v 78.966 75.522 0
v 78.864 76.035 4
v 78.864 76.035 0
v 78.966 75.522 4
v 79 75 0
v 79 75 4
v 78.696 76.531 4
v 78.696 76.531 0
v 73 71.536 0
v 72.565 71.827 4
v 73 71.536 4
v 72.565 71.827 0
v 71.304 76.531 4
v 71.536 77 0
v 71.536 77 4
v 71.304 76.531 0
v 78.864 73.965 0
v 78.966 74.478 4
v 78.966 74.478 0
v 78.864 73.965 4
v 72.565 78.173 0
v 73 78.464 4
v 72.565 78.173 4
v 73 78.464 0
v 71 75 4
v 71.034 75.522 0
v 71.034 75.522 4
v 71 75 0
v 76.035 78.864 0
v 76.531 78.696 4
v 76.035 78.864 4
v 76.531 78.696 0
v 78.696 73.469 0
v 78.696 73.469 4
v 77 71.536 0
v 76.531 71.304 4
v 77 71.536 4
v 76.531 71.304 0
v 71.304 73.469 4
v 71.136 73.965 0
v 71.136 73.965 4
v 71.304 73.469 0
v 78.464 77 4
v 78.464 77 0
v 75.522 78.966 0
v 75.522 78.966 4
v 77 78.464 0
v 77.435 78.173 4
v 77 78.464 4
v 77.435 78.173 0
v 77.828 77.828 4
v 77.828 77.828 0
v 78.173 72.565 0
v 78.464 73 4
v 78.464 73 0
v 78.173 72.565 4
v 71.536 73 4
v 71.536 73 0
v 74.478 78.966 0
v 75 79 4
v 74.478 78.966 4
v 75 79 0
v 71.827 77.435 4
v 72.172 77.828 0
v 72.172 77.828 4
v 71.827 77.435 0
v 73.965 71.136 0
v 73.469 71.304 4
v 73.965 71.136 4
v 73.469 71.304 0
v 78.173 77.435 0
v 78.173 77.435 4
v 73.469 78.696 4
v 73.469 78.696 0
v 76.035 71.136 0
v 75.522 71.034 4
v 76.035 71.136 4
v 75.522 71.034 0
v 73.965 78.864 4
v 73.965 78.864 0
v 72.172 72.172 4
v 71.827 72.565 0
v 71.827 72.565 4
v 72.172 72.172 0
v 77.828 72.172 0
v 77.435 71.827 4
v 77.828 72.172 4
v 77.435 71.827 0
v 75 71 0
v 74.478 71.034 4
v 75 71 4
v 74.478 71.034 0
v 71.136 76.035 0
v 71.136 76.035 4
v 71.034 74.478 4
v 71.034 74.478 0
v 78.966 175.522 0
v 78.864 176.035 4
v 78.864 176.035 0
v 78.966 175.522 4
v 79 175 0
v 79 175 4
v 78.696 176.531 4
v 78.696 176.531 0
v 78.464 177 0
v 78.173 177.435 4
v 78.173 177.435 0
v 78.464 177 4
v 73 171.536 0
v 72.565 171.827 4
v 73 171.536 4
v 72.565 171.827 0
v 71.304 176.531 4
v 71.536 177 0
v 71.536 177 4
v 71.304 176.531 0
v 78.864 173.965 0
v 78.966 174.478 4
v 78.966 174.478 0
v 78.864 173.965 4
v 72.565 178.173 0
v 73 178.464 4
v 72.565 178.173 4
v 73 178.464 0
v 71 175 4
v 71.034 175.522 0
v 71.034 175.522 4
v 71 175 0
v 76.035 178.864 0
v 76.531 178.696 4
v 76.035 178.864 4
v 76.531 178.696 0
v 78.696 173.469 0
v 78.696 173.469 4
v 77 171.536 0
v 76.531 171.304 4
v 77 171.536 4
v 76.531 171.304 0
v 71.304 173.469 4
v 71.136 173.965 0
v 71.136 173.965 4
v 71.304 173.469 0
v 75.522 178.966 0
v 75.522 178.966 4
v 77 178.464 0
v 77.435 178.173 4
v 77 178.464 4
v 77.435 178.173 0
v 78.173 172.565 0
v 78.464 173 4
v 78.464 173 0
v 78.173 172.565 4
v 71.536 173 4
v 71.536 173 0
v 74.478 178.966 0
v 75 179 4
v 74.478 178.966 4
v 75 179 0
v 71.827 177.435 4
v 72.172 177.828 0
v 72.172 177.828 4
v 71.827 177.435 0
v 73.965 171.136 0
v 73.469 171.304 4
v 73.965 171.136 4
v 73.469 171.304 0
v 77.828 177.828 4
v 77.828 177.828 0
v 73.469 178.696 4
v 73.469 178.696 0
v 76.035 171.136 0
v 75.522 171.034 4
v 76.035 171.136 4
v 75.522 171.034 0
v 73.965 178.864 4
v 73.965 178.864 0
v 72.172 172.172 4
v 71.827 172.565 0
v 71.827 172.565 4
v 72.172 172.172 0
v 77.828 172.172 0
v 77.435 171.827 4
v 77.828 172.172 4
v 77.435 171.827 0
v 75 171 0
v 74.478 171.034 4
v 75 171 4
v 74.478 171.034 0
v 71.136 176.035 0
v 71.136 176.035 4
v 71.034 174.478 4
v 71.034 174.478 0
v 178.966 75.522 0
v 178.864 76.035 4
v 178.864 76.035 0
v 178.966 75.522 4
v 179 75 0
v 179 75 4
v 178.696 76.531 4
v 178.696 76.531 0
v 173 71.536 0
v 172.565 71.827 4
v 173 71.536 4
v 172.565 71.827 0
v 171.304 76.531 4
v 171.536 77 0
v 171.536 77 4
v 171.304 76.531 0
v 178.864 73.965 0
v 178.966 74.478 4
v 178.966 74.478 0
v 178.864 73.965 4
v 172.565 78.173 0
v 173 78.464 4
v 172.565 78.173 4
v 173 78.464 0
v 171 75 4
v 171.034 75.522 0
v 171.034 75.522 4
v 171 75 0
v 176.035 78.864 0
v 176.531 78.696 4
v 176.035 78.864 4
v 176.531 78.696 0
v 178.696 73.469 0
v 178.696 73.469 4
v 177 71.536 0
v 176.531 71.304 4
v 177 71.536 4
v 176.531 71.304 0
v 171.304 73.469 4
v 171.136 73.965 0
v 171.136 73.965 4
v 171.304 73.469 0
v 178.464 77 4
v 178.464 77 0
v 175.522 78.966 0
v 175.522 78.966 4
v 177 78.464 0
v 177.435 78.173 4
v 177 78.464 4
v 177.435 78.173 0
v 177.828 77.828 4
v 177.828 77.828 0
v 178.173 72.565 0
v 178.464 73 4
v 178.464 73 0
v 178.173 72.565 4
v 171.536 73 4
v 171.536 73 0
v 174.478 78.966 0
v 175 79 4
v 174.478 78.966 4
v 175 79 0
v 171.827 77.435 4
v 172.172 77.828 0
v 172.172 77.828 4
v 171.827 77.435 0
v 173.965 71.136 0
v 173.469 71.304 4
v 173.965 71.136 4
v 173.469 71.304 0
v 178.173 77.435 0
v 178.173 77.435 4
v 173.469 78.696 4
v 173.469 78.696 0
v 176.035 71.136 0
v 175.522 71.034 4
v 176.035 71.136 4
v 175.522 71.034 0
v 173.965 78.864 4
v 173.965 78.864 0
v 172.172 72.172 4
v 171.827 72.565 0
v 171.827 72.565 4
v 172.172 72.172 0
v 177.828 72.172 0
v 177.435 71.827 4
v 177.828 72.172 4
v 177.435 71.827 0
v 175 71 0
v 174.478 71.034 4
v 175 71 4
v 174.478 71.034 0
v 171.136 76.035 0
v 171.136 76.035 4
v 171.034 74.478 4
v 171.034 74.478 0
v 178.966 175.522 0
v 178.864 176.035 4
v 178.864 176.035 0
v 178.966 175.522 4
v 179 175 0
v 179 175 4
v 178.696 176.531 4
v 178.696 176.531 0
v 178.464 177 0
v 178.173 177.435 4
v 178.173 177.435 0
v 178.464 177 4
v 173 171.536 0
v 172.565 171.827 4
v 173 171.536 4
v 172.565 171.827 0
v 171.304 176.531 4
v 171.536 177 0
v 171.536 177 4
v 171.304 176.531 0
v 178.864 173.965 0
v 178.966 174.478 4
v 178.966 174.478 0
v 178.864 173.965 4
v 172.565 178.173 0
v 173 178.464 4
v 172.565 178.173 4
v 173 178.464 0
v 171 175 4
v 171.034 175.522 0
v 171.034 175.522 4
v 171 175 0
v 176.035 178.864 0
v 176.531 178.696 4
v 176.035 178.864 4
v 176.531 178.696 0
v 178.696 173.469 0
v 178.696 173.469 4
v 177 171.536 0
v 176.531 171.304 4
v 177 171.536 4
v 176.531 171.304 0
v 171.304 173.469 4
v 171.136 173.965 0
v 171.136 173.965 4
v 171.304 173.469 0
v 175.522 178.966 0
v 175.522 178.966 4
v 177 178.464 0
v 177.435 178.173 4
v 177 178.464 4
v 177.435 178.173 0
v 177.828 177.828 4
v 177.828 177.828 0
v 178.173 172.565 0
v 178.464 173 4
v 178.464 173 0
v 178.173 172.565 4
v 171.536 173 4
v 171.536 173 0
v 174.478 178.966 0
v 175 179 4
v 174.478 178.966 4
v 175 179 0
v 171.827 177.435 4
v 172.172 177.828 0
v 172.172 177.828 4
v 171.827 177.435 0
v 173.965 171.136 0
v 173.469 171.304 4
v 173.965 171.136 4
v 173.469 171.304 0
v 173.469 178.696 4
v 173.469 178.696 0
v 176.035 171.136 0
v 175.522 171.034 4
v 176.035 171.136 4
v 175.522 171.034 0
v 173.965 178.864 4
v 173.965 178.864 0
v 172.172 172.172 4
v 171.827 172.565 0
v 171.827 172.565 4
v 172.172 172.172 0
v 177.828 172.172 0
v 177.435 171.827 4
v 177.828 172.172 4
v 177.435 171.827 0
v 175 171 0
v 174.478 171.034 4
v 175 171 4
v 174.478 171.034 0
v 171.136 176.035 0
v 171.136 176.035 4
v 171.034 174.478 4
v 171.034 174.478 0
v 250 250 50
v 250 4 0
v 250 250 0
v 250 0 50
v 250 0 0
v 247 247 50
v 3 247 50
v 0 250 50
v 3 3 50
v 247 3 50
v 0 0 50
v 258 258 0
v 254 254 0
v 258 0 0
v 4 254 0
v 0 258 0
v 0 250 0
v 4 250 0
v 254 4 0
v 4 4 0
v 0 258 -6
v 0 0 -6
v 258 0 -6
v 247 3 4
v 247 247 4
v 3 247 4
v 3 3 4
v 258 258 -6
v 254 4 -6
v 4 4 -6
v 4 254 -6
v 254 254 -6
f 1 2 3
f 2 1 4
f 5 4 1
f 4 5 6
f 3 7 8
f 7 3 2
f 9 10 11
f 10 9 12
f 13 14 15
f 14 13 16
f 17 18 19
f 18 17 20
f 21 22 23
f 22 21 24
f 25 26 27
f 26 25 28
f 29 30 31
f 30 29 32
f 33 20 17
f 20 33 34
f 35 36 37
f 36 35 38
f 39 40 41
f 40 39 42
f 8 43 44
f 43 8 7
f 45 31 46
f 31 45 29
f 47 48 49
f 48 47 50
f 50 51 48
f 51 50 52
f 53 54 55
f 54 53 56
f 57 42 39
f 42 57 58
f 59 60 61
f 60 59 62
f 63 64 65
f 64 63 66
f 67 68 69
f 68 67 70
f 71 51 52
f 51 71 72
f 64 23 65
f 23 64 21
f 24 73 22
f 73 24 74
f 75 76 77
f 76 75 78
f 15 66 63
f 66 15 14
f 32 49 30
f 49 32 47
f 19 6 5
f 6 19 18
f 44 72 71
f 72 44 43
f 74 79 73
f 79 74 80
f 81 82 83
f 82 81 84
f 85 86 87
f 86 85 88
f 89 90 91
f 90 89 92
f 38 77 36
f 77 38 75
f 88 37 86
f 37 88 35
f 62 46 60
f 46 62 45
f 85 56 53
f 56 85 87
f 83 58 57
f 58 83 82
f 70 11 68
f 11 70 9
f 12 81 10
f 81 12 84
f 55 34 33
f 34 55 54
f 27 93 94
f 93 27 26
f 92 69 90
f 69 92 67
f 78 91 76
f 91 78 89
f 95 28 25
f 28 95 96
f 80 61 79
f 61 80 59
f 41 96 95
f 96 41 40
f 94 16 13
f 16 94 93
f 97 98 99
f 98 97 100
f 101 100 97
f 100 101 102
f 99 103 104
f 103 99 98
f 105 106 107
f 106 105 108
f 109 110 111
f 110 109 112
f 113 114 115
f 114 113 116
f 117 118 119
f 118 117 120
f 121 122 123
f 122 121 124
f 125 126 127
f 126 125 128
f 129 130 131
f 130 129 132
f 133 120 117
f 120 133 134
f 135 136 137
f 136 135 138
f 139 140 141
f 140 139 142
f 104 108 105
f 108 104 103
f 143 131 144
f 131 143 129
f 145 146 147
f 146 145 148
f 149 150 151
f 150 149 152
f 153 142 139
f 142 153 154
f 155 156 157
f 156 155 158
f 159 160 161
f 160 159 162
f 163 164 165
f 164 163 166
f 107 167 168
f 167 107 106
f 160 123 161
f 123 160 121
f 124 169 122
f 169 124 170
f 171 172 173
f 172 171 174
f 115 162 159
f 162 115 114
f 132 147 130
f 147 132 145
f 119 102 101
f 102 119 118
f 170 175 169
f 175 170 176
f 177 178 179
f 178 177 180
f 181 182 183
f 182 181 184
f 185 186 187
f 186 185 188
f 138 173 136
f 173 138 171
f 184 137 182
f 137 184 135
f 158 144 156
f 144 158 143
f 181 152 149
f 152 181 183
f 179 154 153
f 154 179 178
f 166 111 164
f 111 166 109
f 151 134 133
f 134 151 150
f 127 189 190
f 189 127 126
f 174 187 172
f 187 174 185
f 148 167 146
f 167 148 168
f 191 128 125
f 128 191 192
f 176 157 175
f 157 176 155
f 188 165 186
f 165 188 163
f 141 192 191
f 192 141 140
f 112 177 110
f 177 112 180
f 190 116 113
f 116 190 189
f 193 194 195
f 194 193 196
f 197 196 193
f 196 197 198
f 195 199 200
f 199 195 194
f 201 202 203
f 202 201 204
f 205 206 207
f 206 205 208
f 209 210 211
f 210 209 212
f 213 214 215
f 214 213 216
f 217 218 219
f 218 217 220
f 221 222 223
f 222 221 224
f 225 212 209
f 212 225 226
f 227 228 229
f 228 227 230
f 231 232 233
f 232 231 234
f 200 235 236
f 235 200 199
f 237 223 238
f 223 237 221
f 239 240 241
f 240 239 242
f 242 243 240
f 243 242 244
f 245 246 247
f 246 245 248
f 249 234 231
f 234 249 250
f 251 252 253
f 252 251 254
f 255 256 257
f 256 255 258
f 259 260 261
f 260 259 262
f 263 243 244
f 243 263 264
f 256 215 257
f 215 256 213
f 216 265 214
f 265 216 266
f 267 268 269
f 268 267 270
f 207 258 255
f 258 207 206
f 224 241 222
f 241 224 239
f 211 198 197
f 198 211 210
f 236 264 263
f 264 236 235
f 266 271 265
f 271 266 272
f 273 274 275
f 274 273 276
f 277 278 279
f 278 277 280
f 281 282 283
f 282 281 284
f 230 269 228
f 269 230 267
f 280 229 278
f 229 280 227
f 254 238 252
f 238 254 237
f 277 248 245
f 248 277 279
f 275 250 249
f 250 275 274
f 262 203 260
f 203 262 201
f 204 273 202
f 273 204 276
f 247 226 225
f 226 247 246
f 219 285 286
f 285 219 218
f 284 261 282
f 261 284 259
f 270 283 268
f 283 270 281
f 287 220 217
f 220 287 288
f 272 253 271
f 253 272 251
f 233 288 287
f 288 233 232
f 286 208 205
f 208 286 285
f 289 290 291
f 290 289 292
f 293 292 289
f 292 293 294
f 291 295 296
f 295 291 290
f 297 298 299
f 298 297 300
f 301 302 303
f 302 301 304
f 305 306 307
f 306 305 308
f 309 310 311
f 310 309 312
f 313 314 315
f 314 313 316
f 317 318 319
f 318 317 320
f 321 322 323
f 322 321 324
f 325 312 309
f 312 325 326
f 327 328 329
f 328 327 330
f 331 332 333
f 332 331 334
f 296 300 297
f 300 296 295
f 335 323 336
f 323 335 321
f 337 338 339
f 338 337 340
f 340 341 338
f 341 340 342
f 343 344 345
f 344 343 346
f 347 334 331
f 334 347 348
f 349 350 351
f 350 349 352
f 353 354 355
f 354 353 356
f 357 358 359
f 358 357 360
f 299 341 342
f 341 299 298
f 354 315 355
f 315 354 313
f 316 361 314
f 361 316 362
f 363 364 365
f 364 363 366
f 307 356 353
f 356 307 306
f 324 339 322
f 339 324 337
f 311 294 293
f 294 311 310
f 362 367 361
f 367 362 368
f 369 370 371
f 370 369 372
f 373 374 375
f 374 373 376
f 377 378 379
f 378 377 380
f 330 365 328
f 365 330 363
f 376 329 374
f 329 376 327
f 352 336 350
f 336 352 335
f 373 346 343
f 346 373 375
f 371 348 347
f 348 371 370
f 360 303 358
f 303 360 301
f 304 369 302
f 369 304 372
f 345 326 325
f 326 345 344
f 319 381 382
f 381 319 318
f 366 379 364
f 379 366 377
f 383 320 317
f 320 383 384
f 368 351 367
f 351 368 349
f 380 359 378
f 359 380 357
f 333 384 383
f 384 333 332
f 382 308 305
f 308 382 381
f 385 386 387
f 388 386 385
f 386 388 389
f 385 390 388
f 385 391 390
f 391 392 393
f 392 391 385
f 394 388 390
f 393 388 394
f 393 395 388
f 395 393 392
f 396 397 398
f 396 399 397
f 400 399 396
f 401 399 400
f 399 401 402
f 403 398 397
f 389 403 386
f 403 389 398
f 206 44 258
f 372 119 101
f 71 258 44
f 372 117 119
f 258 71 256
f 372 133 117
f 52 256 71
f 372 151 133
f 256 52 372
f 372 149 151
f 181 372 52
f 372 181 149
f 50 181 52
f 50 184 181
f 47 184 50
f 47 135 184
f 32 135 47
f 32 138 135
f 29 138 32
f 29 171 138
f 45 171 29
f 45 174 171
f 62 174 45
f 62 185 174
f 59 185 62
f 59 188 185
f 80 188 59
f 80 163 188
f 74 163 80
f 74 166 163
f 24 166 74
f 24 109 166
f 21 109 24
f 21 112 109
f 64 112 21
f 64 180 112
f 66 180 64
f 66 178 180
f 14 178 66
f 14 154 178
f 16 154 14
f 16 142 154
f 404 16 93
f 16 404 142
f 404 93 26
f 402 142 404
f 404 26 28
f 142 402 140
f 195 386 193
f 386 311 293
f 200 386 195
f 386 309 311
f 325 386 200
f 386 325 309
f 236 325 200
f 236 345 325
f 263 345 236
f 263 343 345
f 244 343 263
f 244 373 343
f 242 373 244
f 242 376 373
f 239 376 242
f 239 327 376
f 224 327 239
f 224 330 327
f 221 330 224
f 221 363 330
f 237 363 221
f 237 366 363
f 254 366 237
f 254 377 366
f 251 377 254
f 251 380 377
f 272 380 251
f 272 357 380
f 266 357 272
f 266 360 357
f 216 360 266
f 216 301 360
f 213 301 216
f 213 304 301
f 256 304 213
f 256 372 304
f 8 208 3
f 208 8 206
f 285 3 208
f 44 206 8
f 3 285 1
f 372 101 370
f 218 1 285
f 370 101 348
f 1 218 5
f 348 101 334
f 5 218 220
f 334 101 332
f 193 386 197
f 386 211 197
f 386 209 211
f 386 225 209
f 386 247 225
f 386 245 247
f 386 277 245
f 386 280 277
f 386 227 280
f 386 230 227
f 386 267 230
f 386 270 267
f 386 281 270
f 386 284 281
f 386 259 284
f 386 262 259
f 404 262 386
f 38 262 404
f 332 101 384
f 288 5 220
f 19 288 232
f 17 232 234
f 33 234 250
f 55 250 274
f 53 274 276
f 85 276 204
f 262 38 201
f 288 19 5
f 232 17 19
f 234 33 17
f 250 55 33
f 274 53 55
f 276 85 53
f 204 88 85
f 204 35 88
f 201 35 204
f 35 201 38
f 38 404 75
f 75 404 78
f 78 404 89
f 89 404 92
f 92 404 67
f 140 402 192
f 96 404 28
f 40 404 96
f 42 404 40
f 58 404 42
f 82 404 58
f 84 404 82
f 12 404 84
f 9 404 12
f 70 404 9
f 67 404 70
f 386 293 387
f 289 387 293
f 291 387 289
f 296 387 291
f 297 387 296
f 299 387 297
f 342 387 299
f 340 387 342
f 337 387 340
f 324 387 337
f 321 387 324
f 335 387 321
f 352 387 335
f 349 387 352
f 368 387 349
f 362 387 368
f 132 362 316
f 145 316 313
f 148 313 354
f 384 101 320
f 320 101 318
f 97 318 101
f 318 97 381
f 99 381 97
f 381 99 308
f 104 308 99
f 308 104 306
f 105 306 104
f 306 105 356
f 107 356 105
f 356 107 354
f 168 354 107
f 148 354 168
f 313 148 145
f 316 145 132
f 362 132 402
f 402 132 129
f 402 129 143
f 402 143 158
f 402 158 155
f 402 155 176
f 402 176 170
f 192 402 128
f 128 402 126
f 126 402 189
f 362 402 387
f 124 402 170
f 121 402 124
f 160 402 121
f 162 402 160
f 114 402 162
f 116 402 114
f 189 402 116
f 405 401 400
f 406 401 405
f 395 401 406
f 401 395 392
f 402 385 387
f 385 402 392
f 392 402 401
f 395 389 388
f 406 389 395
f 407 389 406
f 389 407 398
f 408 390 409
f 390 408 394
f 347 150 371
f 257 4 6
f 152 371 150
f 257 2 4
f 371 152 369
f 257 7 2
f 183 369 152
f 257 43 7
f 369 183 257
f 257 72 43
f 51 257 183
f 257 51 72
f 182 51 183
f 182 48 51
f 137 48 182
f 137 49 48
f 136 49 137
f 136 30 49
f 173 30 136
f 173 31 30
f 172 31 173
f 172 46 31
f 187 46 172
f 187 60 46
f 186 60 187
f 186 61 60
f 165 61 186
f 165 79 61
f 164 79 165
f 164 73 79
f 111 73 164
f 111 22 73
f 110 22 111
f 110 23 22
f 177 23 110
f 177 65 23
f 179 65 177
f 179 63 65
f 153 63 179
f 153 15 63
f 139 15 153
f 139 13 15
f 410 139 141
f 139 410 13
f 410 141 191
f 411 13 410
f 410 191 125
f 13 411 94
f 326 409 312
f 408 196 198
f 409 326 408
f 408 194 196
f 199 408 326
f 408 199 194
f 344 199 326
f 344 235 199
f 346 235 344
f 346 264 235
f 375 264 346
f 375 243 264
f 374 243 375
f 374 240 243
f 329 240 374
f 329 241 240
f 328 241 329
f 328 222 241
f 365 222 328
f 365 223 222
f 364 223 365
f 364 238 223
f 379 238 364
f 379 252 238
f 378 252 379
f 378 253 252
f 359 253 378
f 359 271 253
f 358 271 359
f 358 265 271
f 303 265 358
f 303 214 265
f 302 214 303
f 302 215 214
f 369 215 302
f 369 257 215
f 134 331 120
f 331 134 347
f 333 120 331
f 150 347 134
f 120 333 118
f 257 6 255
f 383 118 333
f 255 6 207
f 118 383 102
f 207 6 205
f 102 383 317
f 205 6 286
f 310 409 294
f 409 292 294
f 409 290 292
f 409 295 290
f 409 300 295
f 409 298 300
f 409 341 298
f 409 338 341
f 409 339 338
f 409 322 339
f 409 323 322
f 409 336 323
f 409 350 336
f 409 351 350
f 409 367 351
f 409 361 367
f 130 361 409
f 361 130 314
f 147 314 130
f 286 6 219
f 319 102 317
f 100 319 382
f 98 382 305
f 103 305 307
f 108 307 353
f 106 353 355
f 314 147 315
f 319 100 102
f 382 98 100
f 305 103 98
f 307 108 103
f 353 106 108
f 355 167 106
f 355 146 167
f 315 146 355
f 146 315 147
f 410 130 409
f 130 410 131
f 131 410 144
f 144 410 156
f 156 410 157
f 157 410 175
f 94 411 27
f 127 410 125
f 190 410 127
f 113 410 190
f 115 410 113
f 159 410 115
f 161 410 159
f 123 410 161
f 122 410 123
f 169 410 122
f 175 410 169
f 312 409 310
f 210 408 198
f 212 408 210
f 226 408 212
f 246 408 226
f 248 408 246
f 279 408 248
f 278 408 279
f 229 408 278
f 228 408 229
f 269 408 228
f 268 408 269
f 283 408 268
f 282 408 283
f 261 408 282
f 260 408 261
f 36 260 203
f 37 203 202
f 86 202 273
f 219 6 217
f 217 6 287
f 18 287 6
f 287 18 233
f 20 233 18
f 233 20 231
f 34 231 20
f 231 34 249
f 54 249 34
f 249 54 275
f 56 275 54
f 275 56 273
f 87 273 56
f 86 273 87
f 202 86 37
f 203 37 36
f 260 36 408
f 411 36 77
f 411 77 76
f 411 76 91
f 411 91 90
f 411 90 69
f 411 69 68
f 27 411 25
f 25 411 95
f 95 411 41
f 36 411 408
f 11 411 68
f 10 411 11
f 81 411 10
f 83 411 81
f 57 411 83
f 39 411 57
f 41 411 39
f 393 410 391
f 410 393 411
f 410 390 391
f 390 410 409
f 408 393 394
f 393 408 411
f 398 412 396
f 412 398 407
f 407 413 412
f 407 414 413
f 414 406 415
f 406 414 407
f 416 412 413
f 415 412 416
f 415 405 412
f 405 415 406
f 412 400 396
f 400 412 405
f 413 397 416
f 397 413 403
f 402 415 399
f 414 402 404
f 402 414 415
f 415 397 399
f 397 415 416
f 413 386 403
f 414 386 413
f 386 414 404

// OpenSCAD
// ============================================================
// Growing Tray  (growing_tray.stl)
// ============================================================
// Outer: 250×250×50mm  (25×25cm = 625cm² growing area)
// Interior: 244×244×40mm
// 4× Ø8mm drain holes in 2×2 grid, 50mm from tray centre
// Retention lip (5mm high, 4mm wide) on outer base perimeter
//   slides into the growing tray ledge in the ring.
//
// Print orientation: upside-down (open face on bed).
//   Footprint: 250×250mm.  Requires 250mm bed in both axes.
//   NOTE: A 200mm bed is insufficient; 250mm minimum required.
//   Alternative: split into 2 halves at X=125mm (150mm bed OK).
//
// Material: PETG.  No supports needed.
// Post-process: none required (not a sealed water chamber).
// ============================================================

include <params.scad>

module growing_tray() {
    difference() {

        // --- Outer tray body ---
        cube([tray_w, tray_d, tray_h]);

        // --- Interior void (open top) ---
        translate([tray_wall, tray_wall, tray_floor])
            cube([tray_w - 2*tray_wall,
                  tray_d - 2*tray_wall,
                  tray_h - tray_floor + eps]);

        // --- 4× drain holes (2×2 grid in tray floor) ---
        // Holes at (125±50, 125±50) = (75,75), (75,175), (175,75), (175,175)
        cx = tray_w / 2;
        cy = tray_d / 2;
        for (dx = [-drain_inset, drain_inset])
            for (dy = [-drain_inset, drain_inset])
                translate([cx + dx, cy + dy, -eps])
                    cylinder(d=drain_d, h=tray_floor + 2*eps);

    } // end difference

    // --- Retention lip (outside of tray base perimeter) ---
    // This lip slides under the growing-tray ledge rails inside the ring,
    // holding the tray against ejection during vehicle motion.
    translate([0, 0, -tray_lip_h])
        difference() {
            cube([tray_w + 2*tray_lip_w,
                  tray_d + 2*tray_lip_w,
                  tray_lip_h]);
            translate([tray_lip_w, tray_lip_w, -eps])
                cube([tray_w, tray_d, tray_lip_h + 2*eps]);
        }
}

growing_tray();
